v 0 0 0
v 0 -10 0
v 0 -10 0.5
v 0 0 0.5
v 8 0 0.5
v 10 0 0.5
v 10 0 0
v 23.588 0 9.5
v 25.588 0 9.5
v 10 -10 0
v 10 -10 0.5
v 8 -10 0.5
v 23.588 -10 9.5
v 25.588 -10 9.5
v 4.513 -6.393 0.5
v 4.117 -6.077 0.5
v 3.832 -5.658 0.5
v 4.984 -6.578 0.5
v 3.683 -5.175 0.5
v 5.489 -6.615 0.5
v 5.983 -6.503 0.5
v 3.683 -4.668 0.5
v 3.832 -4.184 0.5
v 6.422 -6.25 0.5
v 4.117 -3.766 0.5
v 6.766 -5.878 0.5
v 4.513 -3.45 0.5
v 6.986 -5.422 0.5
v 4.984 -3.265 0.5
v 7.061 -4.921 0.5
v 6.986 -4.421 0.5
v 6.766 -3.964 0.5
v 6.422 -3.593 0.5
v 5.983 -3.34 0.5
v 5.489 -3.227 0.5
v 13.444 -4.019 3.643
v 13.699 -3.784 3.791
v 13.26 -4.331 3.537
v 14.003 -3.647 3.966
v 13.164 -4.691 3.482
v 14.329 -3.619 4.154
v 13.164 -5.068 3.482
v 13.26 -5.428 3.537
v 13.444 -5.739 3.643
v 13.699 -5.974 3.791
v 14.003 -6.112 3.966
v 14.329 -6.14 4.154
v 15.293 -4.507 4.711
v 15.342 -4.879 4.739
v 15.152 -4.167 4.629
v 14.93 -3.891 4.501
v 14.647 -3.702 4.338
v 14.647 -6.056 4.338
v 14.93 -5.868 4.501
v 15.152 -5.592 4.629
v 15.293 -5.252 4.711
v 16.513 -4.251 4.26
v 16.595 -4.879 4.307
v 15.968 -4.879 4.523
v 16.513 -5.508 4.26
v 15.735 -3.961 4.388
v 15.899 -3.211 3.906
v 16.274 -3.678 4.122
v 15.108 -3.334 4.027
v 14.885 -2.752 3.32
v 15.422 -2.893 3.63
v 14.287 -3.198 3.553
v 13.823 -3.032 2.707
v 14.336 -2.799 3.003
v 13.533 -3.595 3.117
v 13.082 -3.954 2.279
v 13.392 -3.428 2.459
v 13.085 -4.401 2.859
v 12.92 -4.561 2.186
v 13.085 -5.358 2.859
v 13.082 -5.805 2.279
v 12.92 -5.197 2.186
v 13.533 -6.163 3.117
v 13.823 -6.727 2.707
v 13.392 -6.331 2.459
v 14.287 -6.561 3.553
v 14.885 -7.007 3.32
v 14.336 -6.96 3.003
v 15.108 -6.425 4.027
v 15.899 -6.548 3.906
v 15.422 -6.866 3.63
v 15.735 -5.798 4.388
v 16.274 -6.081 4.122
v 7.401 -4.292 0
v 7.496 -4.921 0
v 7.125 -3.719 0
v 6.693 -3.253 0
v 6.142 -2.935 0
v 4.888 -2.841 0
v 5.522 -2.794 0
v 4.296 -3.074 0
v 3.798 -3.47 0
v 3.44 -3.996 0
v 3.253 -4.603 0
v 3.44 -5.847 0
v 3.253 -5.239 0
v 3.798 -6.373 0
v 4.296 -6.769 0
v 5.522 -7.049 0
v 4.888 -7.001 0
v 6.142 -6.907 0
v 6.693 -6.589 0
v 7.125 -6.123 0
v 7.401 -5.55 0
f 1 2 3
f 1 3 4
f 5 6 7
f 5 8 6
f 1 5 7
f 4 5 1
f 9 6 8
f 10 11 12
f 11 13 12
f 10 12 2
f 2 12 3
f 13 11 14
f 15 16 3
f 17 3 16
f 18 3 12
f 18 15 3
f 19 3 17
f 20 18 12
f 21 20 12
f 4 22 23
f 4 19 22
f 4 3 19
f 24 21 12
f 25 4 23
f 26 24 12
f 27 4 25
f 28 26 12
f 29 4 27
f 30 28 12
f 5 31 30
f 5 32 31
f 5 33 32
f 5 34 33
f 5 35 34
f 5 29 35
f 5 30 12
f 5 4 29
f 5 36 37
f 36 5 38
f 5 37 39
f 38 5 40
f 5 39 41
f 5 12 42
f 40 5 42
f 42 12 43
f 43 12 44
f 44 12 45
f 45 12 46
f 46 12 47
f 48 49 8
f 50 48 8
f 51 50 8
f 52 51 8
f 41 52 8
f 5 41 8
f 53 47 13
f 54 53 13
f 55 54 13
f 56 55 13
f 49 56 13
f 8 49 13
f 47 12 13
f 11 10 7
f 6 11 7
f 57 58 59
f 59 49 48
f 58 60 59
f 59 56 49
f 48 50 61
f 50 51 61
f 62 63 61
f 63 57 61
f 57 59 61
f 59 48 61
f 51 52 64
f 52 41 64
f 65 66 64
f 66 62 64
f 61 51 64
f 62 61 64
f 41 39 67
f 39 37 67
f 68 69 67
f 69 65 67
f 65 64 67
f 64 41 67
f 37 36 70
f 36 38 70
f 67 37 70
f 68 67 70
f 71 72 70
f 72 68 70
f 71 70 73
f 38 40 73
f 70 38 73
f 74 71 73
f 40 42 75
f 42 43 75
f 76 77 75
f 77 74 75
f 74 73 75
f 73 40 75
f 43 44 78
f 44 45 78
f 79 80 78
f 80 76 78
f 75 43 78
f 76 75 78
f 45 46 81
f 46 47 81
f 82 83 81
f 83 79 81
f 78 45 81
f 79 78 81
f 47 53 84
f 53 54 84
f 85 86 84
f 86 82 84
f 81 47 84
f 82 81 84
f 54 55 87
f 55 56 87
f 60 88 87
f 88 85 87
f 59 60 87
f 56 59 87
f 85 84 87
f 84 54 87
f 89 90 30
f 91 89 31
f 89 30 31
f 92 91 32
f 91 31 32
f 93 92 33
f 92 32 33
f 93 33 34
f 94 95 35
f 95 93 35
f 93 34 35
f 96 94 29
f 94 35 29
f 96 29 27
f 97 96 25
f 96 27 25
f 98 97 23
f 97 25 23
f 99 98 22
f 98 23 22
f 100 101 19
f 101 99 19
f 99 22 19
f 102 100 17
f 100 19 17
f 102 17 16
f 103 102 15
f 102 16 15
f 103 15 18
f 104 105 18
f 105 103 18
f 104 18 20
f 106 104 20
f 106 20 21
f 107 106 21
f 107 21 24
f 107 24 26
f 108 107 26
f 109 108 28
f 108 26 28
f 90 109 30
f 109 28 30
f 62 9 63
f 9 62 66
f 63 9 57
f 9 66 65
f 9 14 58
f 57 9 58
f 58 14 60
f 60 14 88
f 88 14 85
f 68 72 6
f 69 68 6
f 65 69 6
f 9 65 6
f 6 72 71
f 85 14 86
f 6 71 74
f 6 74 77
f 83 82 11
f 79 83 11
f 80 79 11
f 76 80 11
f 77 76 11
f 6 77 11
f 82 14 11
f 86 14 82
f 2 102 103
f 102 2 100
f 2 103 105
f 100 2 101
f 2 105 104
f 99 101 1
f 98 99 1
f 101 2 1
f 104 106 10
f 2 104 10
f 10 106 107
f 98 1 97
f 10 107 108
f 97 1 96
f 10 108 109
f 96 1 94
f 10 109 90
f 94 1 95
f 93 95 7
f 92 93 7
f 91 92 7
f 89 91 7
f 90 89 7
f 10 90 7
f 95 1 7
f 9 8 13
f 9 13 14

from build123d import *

# Parameters (mm, degrees)
SKETCH2_W                                         = 10
SKETCH2_H                                         = 10
BOSS_EXTRUDE1_DEPTH                               = 0.5
BOSS_EXTRUDE2_DEPTH                               = 10
CSK_FOR_1_FLAT_HEAD_SOCKET_CAP_SCREW1_D           = 2.0574
CSK_FOR_1_FLAT_HEAD_SOCKET_CAP_SCREW1_CSINK_D     = 4.2672
CSK_FOR_1_FLAT_HEAD_SOCKET_CAP_SCREW1_CSINK_ANGLE = 82
CSK_FOR_1_FLAT_HEAD_SOCKET_CAP_SCREW2_D           = 2.0574
CSK_FOR_1_FLAT_HEAD_SOCKET_CAP_SCREW2_CSINK_D     = 4.2672
CSK_FOR_1_FLAT_HEAD_SOCKET_CAP_SCREW2_CSINK_ANGLE = 82


with BuildPart() as part:
    # Sketch2 → Boss-Extrude1 (new body)
    with BuildSketch(Plane.XY):
        with Locations((5, -5)):
            Rectangle(SKETCH2_W, SKETCH2_H)
    extrude(amount=BOSS_EXTRUDE1_DEPTH)

    # Sketch3 → Boss-Extrude2 (add)
    with BuildSketch(Plane.XZ.offset(10)):
        Polygon((8, 0.5), (23.588457268, 9.5), (25.588457268, 9.5), (10, 0.5), align=None)
    extrude(amount=-BOSS_EXTRUDE2_DEPTH)

    # CSK for #1 Flat Head Socket Cap Screw1 (through all)
    with Locations(Plane(origin=(0, 0, 0), x_dir=(-1, 0, 0), z_dir=(0, 0, -1))):
        with Locations((-5.362516401, -4.921292394)):
            CounterSinkHole(CSK_FOR_1_FLAT_HEAD_SOCKET_CAP_SCREW1_D / 2, CSK_FOR_1_FLAT_HEAD_SOCKET_CAP_SCREW1_CSINK_D / 2, counter_sink_angle=CSK_FOR_1_FLAT_HEAD_SOCKET_CAP_SCREW1_CSINK_ANGLE)

    # CSK for #1 Flat Head Socket Cap Screw2 (through all)
    with Locations(Plane(origin=(2.283493649, 0, -3.955127019), x_dir=(-0.866025404, 0, -0.5), z_dir=(0.5, 0, -0.866025404))):
        with Locations((-14.39146791, -4.879407471)):
            CounterSinkHole(CSK_FOR_1_FLAT_HEAD_SOCKET_CAP_SCREW2_D / 2, CSK_FOR_1_FLAT_HEAD_SOCKET_CAP_SCREW2_CSINK_D / 2, counter_sink_angle=CSK_FOR_1_FLAT_HEAD_SOCKET_CAP_SCREW2_CSINK_ANGLE)


solid = part.part
